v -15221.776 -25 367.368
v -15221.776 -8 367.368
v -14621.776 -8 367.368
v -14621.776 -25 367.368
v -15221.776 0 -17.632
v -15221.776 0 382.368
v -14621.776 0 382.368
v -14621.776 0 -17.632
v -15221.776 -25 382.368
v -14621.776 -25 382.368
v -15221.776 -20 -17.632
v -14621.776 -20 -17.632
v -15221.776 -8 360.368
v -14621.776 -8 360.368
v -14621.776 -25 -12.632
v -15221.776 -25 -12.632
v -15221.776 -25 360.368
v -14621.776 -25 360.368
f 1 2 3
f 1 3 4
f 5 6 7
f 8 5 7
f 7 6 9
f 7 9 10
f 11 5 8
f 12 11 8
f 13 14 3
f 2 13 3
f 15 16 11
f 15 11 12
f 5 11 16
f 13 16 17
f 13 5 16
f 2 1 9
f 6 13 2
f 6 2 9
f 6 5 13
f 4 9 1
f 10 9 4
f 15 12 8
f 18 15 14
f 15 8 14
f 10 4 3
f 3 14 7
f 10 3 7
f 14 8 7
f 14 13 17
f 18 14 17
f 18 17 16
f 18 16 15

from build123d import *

# Parameters (mm, degrees)
F0_W     = 600
F0_H     = 400
F1_DEPTH = 25
F2_SIZE  = 5
F3_W     = 36.971099
F3_H     = 7
F4_DEPTH = 1000


with BuildPart() as f1:
    # F0 (on Front) → F1 (new body)
    with BuildSketch(Plane.XZ):
        with Locations((-14921.775502, 182.368167)):
            Rectangle(F0_W, F0_H)
    extrude(amount=F1_DEPTH)

    # F2
    f2_edges = [f1.edges().sort_by_distance(p)[0] for p in [
        (-14921.775502, -25, -17.631833),
    ]]
    chamfer(f2_edges, length=F2_SIZE)

    # F3 (on face) → F4 (cut)
    with BuildSketch(Plane(origin=(-15221.775502, 0, 0), x_dir=(0, -1, 0), z_dir=(-1, 0, 0))):
        with Locations((26.485549, 363.868167)):
            Rectangle(F3_W, F3_H)
    extrude(amount=-F4_DEPTH, mode=Mode.SUBTRACT)


solid = f1.part
